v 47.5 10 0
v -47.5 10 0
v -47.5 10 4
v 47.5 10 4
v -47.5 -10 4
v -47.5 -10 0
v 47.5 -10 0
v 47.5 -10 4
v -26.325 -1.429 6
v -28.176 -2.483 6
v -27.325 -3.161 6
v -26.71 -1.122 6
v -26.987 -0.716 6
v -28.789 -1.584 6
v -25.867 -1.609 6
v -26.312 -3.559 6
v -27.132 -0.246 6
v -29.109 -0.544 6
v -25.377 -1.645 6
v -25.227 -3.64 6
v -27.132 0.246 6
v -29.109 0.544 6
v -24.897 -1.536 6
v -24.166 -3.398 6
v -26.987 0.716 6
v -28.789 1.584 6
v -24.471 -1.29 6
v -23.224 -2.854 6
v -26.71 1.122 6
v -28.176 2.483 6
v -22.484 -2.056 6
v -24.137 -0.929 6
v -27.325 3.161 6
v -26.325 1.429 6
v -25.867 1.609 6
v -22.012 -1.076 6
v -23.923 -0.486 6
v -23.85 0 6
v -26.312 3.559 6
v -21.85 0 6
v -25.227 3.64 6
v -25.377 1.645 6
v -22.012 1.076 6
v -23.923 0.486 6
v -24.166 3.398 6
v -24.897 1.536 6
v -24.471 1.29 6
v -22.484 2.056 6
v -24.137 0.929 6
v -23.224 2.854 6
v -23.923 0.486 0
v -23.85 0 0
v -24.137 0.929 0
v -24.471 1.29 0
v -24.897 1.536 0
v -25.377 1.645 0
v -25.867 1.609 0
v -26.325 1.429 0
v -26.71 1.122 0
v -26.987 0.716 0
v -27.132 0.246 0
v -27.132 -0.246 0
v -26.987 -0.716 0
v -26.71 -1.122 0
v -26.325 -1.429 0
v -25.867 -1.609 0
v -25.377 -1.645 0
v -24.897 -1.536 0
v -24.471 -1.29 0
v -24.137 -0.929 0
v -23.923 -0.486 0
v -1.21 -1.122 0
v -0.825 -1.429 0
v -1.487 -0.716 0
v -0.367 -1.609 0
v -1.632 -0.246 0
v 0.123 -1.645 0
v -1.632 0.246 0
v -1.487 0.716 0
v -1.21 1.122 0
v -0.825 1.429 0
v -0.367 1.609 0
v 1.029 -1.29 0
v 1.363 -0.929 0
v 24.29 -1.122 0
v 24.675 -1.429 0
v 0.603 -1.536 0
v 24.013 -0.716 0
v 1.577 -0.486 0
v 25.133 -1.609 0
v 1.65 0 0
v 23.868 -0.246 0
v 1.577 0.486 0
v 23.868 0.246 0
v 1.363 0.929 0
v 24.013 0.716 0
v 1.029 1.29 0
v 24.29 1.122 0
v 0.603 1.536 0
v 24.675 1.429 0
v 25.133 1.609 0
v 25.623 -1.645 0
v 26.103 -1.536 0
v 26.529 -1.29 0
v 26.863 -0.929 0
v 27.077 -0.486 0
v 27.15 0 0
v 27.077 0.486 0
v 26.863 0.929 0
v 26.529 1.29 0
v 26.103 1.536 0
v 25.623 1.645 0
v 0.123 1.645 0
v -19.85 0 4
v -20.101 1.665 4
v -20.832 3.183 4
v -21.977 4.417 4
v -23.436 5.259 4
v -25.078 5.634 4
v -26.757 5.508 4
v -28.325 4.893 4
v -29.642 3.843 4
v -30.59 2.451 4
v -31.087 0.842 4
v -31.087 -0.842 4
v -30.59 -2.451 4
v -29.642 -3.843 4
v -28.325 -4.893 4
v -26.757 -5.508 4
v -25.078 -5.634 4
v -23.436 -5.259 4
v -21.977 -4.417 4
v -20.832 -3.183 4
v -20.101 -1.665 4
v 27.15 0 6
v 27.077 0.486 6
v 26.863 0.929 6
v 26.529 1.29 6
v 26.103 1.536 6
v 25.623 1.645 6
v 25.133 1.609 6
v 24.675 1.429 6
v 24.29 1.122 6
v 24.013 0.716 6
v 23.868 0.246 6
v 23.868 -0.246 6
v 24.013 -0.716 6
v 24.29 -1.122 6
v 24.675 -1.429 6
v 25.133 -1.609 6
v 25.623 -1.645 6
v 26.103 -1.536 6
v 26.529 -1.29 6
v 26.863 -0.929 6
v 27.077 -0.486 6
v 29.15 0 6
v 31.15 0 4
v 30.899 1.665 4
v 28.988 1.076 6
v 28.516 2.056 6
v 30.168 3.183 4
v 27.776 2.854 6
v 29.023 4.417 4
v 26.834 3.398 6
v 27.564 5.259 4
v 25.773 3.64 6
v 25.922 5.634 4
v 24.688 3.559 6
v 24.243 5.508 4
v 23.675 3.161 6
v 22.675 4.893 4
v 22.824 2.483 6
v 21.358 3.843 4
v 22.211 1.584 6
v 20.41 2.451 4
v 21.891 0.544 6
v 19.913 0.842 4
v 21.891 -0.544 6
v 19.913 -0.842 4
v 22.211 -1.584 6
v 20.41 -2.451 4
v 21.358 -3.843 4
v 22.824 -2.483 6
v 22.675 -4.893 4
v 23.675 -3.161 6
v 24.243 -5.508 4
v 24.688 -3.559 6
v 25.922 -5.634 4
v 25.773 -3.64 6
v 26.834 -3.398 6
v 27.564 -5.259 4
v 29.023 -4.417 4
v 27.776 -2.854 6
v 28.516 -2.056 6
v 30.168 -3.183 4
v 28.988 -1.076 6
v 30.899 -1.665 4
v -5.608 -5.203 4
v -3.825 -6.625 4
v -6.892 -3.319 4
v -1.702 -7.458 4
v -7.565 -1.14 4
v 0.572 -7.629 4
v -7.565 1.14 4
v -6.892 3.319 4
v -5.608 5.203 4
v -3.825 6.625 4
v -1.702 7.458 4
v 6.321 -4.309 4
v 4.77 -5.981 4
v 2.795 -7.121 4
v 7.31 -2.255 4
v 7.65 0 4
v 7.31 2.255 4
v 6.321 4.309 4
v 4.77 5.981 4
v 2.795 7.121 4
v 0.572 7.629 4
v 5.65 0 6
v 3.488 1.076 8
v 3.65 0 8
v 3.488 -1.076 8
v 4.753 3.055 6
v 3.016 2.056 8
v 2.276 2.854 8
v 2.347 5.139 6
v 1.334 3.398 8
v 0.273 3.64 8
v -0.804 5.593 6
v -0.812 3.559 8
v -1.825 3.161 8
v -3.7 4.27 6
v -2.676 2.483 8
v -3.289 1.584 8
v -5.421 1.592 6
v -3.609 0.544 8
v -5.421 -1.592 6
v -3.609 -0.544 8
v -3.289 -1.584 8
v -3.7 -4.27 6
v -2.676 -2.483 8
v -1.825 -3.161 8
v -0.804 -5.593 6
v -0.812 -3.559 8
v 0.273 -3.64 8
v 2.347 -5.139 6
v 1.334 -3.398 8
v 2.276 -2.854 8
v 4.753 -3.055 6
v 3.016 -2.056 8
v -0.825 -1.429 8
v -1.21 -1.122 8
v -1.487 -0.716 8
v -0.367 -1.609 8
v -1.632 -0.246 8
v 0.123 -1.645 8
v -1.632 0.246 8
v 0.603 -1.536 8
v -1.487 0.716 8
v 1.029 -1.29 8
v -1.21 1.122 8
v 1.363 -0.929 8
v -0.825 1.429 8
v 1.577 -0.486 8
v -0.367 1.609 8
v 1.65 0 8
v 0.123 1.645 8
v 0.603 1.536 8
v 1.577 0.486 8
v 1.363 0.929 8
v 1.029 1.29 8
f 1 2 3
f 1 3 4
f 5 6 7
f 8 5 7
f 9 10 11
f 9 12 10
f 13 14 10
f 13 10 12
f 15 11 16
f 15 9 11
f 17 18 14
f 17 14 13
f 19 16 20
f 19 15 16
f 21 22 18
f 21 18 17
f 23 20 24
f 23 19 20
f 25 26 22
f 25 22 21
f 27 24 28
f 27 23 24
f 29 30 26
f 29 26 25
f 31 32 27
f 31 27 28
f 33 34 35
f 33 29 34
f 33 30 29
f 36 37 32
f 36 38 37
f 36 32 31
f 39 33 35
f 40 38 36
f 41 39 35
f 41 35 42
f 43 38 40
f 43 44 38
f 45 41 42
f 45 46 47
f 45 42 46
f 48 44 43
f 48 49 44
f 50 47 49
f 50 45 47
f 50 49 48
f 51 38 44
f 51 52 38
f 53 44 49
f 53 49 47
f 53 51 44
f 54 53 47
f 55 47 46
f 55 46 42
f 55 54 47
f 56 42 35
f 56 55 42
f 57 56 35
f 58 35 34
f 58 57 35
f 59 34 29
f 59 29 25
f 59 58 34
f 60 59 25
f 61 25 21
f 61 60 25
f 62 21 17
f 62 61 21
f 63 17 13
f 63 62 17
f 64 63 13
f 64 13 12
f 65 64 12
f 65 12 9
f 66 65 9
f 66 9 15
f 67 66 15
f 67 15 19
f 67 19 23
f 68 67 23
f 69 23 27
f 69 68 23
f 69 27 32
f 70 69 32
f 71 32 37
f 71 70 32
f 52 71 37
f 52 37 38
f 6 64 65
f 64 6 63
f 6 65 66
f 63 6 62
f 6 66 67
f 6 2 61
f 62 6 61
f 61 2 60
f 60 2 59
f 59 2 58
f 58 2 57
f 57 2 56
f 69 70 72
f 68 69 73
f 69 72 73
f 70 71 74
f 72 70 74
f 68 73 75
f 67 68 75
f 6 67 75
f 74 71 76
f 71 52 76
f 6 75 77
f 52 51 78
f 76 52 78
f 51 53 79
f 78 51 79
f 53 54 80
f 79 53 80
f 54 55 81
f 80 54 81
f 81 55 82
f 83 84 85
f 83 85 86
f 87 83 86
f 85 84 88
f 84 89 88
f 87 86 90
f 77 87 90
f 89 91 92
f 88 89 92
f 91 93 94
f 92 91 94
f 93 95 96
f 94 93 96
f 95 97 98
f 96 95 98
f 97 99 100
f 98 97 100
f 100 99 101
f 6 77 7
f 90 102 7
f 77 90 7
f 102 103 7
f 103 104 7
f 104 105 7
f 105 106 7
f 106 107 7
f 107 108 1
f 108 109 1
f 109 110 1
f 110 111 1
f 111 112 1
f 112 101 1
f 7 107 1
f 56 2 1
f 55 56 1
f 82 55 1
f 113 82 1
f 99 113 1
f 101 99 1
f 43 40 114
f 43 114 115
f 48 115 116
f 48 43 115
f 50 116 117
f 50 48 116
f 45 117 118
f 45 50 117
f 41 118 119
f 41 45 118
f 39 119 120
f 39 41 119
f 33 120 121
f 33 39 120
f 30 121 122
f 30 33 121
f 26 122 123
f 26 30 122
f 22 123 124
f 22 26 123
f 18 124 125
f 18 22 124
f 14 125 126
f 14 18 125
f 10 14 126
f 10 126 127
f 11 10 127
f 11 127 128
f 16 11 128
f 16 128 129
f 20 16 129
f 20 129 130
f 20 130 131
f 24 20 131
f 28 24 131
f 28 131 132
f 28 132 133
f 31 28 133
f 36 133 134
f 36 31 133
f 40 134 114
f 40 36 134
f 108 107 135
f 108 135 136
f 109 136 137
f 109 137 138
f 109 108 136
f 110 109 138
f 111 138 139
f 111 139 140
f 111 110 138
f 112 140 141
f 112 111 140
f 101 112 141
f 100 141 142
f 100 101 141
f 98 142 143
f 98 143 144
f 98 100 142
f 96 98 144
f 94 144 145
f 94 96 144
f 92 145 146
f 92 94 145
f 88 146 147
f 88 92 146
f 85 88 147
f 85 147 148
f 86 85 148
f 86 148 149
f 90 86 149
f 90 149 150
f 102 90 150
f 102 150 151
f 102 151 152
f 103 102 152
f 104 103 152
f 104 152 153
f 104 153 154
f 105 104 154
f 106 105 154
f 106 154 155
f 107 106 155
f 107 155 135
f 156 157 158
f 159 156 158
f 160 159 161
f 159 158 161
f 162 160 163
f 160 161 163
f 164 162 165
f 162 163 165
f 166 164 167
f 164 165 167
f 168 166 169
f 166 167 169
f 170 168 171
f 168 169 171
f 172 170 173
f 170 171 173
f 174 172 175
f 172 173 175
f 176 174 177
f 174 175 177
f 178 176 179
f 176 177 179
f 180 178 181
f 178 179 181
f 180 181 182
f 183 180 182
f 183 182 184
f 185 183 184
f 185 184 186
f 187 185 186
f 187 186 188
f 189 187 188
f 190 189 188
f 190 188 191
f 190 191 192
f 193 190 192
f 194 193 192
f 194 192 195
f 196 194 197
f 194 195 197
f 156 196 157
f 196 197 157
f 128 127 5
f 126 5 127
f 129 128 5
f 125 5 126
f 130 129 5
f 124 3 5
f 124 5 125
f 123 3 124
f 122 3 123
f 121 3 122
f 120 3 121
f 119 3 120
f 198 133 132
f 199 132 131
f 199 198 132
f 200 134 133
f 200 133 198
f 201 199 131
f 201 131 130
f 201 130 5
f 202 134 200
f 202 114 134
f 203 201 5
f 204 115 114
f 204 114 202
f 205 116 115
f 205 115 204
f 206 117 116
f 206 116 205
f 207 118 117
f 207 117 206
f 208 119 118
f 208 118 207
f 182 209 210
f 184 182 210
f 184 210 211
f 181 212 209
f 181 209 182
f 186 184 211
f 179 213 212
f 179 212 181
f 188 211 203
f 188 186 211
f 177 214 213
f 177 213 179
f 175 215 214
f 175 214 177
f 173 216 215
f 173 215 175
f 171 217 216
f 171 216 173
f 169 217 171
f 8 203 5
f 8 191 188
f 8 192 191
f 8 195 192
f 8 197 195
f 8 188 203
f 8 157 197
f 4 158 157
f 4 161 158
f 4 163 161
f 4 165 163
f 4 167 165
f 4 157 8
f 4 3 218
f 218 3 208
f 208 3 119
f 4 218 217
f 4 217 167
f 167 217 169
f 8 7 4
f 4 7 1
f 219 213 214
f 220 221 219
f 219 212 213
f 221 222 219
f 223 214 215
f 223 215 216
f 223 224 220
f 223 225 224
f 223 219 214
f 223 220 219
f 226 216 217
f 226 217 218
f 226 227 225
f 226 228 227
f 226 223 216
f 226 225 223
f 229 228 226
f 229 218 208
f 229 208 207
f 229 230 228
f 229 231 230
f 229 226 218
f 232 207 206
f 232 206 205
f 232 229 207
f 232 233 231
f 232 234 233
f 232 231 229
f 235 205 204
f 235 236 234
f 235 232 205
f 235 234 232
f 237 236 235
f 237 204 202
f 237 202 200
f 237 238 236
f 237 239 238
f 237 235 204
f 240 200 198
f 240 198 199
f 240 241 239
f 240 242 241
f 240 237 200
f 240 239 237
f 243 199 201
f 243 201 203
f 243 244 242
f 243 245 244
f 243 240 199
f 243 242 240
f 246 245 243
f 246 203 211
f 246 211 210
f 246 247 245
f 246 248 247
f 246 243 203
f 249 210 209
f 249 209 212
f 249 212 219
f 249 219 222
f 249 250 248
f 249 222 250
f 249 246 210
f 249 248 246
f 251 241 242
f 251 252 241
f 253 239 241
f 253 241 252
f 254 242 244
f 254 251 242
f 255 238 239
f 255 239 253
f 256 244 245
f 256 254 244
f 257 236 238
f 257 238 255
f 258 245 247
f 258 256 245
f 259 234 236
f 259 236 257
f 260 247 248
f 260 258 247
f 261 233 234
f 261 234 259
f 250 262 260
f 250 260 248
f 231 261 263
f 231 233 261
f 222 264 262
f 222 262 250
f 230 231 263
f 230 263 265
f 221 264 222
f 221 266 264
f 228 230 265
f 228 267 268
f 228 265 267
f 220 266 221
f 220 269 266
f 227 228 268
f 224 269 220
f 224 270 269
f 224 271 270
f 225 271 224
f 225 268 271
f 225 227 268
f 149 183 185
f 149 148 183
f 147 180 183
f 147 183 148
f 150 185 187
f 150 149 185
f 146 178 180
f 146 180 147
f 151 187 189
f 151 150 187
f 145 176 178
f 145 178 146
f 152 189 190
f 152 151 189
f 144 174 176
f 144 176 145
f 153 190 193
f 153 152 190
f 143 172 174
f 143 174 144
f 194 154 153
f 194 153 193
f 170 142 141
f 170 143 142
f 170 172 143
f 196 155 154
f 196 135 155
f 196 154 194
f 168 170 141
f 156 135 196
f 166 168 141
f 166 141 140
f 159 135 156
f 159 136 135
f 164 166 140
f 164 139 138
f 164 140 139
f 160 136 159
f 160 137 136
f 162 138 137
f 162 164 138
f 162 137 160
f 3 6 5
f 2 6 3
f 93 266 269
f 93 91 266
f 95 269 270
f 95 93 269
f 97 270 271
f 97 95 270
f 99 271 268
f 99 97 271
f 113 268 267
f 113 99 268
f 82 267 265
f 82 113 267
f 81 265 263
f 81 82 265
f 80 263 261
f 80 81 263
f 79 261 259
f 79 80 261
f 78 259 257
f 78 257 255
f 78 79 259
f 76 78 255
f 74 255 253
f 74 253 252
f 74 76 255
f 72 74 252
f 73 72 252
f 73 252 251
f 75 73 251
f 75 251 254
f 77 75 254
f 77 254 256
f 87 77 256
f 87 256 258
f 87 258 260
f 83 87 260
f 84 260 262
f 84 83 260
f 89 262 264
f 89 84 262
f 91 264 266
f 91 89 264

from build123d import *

# Parameters (mm, degrees)
SKETCH1_W           = 95
SKETCH1_H           = 20
SKETCH1_R           = 1.65
BOSS_EXTRUDE1_DEPTH = 4
SKETCH2_R           = 5.65
SKETCH2_R_2         = 1.65
EXTRUDE_THIN1_DEPTH = 2
CHAMFER1_SIZE       = 2
SKETCH3_R           = 7.65
SKETCH3_R_2         = 1.65
EXTRUDE_THIN2_DEPTH = 4
CHAMFER2_SIZE       = 4


with BuildPart() as part:
    # Sketch1 → Boss-Extrude1 (new body)
    with BuildSketch(Plane.XY):
        Rectangle(SKETCH1_W, SKETCH1_H)
        Circle(SKETCH1_R, mode=Mode.SUBTRACT)
        with Locations((25.5, 0)):
            Circle(SKETCH1_R, mode=Mode.SUBTRACT)
        with Locations((-25.5, 0)):
            Circle(SKETCH1_R, mode=Mode.SUBTRACT)
    extrude(amount=BOSS_EXTRUDE1_DEPTH)

    # Sketch2 → Extrude-Thin1 (add)
    # profile 1 of 2: a face of its own
    with BuildSketch(Plane.XY.offset(4)):
        with Locations((-25.5, 0)):
            Circle(SKETCH2_R)
        with Locations((-25.5, 0)):
            Circle(SKETCH2_R_2, mode=Mode.SUBTRACT)
    # profile 2 of 2: a face of its own
    with BuildSketch(Plane.XY.offset(4)):
        with Locations((25.5, 0)):
            Circle(SKETCH2_R)
        with Locations((25.5, 0)):
            Circle(SKETCH2_R_2, mode=Mode.SUBTRACT)
    extrude(amount=EXTRUDE_THIN1_DEPTH)

    # Chamfer1
    chamfer1_edges = [part.edges().sort_by_distance(p)[0] for p in [
        (-31.15, 0, 6),
        (19.85, 0, 6),
    ]]
    chamfer(chamfer1_edges, length=CHAMFER1_SIZE - 0.0001)  # a hair under: the kernel refuses the full size

    # Sketch3 → Extrude-Thin2 (add)
    with BuildSketch(Plane.XY.offset(4)):
        Circle(SKETCH3_R)
        Circle(SKETCH3_R_2, mode=Mode.SUBTRACT)
    extrude(amount=EXTRUDE_THIN2_DEPTH)

    # Chamfer2
    chamfer2_edges = [part.edges().sort_by_distance(p)[0] for p in [
        (-7.65, 0, 8),
    ]]
    chamfer(chamfer2_edges, length=CHAMFER2_SIZE - 0.0001)  # a hair under: the kernel refuses the full size


solid = part.part
